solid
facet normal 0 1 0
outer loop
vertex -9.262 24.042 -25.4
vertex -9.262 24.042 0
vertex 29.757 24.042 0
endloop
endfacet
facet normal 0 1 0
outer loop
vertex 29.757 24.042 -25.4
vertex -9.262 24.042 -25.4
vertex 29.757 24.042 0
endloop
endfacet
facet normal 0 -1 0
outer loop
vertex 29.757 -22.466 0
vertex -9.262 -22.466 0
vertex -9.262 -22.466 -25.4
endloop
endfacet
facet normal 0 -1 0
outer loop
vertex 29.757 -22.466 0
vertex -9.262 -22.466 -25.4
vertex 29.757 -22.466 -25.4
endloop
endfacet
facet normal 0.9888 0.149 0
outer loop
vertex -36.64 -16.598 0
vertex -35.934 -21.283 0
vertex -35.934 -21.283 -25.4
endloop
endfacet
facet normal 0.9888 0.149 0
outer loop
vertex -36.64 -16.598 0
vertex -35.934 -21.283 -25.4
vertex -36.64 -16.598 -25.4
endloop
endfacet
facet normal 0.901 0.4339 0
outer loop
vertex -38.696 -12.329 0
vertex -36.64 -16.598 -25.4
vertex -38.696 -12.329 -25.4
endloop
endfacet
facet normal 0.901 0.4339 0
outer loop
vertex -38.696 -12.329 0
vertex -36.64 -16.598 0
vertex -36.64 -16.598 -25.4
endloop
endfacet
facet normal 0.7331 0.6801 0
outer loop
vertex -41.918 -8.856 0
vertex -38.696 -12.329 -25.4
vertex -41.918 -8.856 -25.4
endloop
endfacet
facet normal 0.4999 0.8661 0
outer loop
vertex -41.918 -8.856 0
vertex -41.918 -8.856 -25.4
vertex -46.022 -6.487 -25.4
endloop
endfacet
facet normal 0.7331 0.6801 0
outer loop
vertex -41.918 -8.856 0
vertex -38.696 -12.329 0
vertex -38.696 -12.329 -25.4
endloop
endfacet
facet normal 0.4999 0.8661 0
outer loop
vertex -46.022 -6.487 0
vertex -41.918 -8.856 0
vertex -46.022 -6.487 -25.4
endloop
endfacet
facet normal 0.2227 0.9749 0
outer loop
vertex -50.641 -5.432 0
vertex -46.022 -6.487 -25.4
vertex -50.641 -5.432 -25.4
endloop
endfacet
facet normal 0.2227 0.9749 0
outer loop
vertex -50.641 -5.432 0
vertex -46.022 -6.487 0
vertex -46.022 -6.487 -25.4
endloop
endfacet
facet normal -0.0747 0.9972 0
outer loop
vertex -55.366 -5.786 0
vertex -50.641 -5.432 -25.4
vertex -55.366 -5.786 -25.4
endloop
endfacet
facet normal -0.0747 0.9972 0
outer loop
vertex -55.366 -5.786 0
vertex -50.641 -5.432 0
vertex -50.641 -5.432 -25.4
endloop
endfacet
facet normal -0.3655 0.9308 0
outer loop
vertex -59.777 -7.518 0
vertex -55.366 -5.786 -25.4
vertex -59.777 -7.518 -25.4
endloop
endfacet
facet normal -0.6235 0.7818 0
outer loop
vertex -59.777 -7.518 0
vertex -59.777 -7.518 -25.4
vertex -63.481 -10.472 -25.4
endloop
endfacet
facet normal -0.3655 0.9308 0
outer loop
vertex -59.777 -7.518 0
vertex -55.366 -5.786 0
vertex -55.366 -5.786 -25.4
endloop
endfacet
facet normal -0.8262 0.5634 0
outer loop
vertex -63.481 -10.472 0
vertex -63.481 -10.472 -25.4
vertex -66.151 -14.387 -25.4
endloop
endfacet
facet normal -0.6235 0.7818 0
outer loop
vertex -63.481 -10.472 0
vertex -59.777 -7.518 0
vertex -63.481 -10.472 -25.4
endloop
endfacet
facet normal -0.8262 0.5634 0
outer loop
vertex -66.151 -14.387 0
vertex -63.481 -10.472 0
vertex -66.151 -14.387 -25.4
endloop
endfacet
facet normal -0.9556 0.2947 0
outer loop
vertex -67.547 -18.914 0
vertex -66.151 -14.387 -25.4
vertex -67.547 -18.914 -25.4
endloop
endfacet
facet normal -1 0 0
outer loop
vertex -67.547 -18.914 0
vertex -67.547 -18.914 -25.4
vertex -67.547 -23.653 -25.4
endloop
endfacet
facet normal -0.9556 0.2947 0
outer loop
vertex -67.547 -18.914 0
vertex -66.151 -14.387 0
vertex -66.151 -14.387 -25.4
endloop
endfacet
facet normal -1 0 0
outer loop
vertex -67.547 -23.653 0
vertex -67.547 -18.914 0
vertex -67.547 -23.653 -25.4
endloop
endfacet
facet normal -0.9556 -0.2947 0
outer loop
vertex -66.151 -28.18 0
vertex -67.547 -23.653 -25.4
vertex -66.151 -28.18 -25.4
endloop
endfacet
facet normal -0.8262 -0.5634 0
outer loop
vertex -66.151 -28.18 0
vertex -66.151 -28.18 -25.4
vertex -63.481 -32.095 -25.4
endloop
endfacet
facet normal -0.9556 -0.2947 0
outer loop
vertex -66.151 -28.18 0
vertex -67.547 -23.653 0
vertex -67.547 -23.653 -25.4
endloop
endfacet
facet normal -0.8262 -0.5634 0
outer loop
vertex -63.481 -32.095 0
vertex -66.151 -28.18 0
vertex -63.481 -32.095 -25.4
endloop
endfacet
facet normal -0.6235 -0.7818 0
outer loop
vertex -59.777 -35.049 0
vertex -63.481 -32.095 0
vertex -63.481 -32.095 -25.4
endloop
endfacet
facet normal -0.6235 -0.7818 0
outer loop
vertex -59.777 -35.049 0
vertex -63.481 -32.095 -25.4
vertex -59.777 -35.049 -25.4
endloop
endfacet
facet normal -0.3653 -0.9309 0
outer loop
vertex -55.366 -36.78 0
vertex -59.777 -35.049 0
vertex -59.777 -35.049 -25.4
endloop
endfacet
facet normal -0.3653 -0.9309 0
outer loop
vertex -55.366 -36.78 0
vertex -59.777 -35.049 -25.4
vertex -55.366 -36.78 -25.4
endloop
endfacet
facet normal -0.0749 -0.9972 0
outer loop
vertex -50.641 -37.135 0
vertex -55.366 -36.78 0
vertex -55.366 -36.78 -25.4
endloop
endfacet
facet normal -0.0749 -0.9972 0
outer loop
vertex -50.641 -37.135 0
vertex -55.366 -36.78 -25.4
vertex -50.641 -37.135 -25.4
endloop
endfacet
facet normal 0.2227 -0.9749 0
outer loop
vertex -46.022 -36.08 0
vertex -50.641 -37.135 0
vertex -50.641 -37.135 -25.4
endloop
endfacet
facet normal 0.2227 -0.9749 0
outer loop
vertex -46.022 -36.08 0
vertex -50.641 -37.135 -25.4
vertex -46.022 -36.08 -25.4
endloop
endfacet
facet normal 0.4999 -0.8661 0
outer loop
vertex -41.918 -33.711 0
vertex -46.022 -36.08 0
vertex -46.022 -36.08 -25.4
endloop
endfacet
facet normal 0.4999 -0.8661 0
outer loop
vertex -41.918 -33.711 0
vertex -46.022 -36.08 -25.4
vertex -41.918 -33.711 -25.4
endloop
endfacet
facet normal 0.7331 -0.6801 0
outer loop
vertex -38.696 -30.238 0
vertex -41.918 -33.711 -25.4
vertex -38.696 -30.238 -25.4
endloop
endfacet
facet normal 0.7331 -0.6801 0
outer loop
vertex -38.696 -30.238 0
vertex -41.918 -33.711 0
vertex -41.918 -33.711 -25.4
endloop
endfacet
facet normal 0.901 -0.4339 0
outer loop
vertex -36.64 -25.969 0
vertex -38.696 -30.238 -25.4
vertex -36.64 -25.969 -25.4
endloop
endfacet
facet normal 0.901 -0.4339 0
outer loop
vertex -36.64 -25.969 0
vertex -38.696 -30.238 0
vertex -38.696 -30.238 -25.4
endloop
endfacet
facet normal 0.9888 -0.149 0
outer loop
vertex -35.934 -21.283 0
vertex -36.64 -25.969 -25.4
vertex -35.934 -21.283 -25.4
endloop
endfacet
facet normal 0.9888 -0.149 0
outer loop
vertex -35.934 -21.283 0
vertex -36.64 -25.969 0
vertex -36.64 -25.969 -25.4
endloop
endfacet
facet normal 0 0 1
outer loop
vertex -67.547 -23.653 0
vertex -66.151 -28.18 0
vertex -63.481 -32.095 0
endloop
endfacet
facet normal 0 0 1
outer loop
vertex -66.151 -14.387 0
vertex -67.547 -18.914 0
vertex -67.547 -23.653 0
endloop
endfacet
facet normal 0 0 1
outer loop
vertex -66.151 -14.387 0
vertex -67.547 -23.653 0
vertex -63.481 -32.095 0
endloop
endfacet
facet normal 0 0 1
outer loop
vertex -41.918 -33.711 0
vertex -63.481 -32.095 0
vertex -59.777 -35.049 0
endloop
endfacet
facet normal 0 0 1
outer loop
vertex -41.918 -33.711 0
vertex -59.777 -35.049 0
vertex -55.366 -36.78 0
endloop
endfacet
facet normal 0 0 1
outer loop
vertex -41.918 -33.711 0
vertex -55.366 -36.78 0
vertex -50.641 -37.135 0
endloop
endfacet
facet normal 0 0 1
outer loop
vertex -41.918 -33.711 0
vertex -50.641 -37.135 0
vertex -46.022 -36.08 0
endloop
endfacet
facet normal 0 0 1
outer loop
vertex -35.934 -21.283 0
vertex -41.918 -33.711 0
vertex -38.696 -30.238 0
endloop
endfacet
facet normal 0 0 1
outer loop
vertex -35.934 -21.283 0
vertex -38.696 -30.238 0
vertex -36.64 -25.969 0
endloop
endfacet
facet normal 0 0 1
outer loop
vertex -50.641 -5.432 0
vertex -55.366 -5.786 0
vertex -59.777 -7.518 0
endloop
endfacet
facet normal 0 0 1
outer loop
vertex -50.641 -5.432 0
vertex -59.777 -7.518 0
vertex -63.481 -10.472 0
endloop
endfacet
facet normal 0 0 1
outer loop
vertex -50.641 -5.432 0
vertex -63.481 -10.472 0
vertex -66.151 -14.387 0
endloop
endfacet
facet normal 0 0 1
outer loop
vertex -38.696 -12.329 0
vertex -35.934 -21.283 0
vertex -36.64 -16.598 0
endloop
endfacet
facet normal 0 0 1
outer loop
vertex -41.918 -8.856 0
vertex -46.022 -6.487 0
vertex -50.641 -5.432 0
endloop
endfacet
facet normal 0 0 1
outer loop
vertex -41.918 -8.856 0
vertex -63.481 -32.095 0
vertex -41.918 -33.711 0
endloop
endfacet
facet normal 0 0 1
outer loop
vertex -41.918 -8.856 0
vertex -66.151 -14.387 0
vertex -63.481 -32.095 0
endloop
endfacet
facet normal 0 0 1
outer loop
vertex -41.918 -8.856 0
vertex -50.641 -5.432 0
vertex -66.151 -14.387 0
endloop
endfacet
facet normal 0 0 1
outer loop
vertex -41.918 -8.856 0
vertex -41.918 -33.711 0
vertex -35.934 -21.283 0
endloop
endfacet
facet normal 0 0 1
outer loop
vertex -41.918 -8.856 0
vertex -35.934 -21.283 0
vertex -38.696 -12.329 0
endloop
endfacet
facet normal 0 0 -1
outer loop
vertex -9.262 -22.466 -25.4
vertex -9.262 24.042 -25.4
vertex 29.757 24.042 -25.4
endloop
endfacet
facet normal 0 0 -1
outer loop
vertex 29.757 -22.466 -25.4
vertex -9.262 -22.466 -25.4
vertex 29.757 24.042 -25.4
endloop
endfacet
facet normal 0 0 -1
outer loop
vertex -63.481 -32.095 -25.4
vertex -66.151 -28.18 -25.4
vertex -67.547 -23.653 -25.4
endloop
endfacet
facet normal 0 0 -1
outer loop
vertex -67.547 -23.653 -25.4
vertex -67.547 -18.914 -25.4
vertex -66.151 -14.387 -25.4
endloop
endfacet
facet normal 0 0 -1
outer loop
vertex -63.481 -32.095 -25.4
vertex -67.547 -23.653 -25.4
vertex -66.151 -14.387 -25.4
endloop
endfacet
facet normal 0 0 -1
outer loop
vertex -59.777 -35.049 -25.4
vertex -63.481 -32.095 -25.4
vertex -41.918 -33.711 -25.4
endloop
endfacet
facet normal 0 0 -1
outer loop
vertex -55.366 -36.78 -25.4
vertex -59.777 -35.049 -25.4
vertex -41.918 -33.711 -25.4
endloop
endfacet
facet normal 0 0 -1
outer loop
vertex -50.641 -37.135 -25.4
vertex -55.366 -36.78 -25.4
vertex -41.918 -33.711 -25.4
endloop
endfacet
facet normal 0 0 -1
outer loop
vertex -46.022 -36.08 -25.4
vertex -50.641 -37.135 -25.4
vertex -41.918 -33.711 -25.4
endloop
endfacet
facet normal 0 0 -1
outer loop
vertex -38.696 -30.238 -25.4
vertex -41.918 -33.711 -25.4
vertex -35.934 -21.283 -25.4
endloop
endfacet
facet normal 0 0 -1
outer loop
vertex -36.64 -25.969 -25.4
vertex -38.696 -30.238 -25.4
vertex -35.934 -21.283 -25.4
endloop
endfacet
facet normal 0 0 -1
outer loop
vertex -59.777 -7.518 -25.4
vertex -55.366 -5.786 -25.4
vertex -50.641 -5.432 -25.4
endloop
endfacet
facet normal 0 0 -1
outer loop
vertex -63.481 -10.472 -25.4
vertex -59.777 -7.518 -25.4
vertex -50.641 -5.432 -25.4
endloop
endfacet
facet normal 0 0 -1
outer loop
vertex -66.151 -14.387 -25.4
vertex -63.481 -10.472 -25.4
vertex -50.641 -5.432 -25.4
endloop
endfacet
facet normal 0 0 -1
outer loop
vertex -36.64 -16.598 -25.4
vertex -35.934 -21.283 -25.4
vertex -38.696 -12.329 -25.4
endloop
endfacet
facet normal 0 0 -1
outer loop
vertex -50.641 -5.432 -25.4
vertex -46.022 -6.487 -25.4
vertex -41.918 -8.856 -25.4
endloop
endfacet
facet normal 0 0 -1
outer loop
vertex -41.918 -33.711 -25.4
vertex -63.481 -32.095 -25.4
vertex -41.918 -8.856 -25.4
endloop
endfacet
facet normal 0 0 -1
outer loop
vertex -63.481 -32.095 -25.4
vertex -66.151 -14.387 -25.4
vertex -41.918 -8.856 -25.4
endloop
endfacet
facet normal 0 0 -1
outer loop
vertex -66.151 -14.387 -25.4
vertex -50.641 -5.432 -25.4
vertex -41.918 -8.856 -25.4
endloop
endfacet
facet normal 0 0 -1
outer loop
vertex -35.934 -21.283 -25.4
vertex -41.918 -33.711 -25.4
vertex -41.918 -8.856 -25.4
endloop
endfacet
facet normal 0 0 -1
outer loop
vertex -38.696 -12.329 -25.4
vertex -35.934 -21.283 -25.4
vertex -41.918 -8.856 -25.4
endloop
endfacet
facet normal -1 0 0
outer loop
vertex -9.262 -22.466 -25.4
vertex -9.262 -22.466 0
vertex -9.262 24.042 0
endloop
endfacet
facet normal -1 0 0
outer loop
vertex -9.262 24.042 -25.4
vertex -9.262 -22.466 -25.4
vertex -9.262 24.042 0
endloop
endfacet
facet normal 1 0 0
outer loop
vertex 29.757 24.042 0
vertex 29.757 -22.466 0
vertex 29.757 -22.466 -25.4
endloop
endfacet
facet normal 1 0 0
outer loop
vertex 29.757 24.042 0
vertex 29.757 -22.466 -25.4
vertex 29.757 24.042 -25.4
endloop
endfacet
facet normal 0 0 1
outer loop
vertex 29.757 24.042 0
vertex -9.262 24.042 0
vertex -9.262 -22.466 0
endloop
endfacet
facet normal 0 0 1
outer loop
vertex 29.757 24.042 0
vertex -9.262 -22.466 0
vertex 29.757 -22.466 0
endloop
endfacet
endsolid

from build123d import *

# Parameters (mm, degrees)
F0_W     = 39.019655
F0_H     = 46.508277
F0_R     = 15.895539
F1_DEPTH = 25.4


with BuildPart() as f1:
    # F0 (on Top) → F1 (new body)
    with BuildSketch(Plane.XY):
        with Locations((10.247586, 0.788277)):
            Rectangle(F0_W, F0_H)
        with Locations((-51.829137, -21.283448)):
            Circle(F0_R)
    extrude(amount=-F1_DEPTH)


solid = f1.part
